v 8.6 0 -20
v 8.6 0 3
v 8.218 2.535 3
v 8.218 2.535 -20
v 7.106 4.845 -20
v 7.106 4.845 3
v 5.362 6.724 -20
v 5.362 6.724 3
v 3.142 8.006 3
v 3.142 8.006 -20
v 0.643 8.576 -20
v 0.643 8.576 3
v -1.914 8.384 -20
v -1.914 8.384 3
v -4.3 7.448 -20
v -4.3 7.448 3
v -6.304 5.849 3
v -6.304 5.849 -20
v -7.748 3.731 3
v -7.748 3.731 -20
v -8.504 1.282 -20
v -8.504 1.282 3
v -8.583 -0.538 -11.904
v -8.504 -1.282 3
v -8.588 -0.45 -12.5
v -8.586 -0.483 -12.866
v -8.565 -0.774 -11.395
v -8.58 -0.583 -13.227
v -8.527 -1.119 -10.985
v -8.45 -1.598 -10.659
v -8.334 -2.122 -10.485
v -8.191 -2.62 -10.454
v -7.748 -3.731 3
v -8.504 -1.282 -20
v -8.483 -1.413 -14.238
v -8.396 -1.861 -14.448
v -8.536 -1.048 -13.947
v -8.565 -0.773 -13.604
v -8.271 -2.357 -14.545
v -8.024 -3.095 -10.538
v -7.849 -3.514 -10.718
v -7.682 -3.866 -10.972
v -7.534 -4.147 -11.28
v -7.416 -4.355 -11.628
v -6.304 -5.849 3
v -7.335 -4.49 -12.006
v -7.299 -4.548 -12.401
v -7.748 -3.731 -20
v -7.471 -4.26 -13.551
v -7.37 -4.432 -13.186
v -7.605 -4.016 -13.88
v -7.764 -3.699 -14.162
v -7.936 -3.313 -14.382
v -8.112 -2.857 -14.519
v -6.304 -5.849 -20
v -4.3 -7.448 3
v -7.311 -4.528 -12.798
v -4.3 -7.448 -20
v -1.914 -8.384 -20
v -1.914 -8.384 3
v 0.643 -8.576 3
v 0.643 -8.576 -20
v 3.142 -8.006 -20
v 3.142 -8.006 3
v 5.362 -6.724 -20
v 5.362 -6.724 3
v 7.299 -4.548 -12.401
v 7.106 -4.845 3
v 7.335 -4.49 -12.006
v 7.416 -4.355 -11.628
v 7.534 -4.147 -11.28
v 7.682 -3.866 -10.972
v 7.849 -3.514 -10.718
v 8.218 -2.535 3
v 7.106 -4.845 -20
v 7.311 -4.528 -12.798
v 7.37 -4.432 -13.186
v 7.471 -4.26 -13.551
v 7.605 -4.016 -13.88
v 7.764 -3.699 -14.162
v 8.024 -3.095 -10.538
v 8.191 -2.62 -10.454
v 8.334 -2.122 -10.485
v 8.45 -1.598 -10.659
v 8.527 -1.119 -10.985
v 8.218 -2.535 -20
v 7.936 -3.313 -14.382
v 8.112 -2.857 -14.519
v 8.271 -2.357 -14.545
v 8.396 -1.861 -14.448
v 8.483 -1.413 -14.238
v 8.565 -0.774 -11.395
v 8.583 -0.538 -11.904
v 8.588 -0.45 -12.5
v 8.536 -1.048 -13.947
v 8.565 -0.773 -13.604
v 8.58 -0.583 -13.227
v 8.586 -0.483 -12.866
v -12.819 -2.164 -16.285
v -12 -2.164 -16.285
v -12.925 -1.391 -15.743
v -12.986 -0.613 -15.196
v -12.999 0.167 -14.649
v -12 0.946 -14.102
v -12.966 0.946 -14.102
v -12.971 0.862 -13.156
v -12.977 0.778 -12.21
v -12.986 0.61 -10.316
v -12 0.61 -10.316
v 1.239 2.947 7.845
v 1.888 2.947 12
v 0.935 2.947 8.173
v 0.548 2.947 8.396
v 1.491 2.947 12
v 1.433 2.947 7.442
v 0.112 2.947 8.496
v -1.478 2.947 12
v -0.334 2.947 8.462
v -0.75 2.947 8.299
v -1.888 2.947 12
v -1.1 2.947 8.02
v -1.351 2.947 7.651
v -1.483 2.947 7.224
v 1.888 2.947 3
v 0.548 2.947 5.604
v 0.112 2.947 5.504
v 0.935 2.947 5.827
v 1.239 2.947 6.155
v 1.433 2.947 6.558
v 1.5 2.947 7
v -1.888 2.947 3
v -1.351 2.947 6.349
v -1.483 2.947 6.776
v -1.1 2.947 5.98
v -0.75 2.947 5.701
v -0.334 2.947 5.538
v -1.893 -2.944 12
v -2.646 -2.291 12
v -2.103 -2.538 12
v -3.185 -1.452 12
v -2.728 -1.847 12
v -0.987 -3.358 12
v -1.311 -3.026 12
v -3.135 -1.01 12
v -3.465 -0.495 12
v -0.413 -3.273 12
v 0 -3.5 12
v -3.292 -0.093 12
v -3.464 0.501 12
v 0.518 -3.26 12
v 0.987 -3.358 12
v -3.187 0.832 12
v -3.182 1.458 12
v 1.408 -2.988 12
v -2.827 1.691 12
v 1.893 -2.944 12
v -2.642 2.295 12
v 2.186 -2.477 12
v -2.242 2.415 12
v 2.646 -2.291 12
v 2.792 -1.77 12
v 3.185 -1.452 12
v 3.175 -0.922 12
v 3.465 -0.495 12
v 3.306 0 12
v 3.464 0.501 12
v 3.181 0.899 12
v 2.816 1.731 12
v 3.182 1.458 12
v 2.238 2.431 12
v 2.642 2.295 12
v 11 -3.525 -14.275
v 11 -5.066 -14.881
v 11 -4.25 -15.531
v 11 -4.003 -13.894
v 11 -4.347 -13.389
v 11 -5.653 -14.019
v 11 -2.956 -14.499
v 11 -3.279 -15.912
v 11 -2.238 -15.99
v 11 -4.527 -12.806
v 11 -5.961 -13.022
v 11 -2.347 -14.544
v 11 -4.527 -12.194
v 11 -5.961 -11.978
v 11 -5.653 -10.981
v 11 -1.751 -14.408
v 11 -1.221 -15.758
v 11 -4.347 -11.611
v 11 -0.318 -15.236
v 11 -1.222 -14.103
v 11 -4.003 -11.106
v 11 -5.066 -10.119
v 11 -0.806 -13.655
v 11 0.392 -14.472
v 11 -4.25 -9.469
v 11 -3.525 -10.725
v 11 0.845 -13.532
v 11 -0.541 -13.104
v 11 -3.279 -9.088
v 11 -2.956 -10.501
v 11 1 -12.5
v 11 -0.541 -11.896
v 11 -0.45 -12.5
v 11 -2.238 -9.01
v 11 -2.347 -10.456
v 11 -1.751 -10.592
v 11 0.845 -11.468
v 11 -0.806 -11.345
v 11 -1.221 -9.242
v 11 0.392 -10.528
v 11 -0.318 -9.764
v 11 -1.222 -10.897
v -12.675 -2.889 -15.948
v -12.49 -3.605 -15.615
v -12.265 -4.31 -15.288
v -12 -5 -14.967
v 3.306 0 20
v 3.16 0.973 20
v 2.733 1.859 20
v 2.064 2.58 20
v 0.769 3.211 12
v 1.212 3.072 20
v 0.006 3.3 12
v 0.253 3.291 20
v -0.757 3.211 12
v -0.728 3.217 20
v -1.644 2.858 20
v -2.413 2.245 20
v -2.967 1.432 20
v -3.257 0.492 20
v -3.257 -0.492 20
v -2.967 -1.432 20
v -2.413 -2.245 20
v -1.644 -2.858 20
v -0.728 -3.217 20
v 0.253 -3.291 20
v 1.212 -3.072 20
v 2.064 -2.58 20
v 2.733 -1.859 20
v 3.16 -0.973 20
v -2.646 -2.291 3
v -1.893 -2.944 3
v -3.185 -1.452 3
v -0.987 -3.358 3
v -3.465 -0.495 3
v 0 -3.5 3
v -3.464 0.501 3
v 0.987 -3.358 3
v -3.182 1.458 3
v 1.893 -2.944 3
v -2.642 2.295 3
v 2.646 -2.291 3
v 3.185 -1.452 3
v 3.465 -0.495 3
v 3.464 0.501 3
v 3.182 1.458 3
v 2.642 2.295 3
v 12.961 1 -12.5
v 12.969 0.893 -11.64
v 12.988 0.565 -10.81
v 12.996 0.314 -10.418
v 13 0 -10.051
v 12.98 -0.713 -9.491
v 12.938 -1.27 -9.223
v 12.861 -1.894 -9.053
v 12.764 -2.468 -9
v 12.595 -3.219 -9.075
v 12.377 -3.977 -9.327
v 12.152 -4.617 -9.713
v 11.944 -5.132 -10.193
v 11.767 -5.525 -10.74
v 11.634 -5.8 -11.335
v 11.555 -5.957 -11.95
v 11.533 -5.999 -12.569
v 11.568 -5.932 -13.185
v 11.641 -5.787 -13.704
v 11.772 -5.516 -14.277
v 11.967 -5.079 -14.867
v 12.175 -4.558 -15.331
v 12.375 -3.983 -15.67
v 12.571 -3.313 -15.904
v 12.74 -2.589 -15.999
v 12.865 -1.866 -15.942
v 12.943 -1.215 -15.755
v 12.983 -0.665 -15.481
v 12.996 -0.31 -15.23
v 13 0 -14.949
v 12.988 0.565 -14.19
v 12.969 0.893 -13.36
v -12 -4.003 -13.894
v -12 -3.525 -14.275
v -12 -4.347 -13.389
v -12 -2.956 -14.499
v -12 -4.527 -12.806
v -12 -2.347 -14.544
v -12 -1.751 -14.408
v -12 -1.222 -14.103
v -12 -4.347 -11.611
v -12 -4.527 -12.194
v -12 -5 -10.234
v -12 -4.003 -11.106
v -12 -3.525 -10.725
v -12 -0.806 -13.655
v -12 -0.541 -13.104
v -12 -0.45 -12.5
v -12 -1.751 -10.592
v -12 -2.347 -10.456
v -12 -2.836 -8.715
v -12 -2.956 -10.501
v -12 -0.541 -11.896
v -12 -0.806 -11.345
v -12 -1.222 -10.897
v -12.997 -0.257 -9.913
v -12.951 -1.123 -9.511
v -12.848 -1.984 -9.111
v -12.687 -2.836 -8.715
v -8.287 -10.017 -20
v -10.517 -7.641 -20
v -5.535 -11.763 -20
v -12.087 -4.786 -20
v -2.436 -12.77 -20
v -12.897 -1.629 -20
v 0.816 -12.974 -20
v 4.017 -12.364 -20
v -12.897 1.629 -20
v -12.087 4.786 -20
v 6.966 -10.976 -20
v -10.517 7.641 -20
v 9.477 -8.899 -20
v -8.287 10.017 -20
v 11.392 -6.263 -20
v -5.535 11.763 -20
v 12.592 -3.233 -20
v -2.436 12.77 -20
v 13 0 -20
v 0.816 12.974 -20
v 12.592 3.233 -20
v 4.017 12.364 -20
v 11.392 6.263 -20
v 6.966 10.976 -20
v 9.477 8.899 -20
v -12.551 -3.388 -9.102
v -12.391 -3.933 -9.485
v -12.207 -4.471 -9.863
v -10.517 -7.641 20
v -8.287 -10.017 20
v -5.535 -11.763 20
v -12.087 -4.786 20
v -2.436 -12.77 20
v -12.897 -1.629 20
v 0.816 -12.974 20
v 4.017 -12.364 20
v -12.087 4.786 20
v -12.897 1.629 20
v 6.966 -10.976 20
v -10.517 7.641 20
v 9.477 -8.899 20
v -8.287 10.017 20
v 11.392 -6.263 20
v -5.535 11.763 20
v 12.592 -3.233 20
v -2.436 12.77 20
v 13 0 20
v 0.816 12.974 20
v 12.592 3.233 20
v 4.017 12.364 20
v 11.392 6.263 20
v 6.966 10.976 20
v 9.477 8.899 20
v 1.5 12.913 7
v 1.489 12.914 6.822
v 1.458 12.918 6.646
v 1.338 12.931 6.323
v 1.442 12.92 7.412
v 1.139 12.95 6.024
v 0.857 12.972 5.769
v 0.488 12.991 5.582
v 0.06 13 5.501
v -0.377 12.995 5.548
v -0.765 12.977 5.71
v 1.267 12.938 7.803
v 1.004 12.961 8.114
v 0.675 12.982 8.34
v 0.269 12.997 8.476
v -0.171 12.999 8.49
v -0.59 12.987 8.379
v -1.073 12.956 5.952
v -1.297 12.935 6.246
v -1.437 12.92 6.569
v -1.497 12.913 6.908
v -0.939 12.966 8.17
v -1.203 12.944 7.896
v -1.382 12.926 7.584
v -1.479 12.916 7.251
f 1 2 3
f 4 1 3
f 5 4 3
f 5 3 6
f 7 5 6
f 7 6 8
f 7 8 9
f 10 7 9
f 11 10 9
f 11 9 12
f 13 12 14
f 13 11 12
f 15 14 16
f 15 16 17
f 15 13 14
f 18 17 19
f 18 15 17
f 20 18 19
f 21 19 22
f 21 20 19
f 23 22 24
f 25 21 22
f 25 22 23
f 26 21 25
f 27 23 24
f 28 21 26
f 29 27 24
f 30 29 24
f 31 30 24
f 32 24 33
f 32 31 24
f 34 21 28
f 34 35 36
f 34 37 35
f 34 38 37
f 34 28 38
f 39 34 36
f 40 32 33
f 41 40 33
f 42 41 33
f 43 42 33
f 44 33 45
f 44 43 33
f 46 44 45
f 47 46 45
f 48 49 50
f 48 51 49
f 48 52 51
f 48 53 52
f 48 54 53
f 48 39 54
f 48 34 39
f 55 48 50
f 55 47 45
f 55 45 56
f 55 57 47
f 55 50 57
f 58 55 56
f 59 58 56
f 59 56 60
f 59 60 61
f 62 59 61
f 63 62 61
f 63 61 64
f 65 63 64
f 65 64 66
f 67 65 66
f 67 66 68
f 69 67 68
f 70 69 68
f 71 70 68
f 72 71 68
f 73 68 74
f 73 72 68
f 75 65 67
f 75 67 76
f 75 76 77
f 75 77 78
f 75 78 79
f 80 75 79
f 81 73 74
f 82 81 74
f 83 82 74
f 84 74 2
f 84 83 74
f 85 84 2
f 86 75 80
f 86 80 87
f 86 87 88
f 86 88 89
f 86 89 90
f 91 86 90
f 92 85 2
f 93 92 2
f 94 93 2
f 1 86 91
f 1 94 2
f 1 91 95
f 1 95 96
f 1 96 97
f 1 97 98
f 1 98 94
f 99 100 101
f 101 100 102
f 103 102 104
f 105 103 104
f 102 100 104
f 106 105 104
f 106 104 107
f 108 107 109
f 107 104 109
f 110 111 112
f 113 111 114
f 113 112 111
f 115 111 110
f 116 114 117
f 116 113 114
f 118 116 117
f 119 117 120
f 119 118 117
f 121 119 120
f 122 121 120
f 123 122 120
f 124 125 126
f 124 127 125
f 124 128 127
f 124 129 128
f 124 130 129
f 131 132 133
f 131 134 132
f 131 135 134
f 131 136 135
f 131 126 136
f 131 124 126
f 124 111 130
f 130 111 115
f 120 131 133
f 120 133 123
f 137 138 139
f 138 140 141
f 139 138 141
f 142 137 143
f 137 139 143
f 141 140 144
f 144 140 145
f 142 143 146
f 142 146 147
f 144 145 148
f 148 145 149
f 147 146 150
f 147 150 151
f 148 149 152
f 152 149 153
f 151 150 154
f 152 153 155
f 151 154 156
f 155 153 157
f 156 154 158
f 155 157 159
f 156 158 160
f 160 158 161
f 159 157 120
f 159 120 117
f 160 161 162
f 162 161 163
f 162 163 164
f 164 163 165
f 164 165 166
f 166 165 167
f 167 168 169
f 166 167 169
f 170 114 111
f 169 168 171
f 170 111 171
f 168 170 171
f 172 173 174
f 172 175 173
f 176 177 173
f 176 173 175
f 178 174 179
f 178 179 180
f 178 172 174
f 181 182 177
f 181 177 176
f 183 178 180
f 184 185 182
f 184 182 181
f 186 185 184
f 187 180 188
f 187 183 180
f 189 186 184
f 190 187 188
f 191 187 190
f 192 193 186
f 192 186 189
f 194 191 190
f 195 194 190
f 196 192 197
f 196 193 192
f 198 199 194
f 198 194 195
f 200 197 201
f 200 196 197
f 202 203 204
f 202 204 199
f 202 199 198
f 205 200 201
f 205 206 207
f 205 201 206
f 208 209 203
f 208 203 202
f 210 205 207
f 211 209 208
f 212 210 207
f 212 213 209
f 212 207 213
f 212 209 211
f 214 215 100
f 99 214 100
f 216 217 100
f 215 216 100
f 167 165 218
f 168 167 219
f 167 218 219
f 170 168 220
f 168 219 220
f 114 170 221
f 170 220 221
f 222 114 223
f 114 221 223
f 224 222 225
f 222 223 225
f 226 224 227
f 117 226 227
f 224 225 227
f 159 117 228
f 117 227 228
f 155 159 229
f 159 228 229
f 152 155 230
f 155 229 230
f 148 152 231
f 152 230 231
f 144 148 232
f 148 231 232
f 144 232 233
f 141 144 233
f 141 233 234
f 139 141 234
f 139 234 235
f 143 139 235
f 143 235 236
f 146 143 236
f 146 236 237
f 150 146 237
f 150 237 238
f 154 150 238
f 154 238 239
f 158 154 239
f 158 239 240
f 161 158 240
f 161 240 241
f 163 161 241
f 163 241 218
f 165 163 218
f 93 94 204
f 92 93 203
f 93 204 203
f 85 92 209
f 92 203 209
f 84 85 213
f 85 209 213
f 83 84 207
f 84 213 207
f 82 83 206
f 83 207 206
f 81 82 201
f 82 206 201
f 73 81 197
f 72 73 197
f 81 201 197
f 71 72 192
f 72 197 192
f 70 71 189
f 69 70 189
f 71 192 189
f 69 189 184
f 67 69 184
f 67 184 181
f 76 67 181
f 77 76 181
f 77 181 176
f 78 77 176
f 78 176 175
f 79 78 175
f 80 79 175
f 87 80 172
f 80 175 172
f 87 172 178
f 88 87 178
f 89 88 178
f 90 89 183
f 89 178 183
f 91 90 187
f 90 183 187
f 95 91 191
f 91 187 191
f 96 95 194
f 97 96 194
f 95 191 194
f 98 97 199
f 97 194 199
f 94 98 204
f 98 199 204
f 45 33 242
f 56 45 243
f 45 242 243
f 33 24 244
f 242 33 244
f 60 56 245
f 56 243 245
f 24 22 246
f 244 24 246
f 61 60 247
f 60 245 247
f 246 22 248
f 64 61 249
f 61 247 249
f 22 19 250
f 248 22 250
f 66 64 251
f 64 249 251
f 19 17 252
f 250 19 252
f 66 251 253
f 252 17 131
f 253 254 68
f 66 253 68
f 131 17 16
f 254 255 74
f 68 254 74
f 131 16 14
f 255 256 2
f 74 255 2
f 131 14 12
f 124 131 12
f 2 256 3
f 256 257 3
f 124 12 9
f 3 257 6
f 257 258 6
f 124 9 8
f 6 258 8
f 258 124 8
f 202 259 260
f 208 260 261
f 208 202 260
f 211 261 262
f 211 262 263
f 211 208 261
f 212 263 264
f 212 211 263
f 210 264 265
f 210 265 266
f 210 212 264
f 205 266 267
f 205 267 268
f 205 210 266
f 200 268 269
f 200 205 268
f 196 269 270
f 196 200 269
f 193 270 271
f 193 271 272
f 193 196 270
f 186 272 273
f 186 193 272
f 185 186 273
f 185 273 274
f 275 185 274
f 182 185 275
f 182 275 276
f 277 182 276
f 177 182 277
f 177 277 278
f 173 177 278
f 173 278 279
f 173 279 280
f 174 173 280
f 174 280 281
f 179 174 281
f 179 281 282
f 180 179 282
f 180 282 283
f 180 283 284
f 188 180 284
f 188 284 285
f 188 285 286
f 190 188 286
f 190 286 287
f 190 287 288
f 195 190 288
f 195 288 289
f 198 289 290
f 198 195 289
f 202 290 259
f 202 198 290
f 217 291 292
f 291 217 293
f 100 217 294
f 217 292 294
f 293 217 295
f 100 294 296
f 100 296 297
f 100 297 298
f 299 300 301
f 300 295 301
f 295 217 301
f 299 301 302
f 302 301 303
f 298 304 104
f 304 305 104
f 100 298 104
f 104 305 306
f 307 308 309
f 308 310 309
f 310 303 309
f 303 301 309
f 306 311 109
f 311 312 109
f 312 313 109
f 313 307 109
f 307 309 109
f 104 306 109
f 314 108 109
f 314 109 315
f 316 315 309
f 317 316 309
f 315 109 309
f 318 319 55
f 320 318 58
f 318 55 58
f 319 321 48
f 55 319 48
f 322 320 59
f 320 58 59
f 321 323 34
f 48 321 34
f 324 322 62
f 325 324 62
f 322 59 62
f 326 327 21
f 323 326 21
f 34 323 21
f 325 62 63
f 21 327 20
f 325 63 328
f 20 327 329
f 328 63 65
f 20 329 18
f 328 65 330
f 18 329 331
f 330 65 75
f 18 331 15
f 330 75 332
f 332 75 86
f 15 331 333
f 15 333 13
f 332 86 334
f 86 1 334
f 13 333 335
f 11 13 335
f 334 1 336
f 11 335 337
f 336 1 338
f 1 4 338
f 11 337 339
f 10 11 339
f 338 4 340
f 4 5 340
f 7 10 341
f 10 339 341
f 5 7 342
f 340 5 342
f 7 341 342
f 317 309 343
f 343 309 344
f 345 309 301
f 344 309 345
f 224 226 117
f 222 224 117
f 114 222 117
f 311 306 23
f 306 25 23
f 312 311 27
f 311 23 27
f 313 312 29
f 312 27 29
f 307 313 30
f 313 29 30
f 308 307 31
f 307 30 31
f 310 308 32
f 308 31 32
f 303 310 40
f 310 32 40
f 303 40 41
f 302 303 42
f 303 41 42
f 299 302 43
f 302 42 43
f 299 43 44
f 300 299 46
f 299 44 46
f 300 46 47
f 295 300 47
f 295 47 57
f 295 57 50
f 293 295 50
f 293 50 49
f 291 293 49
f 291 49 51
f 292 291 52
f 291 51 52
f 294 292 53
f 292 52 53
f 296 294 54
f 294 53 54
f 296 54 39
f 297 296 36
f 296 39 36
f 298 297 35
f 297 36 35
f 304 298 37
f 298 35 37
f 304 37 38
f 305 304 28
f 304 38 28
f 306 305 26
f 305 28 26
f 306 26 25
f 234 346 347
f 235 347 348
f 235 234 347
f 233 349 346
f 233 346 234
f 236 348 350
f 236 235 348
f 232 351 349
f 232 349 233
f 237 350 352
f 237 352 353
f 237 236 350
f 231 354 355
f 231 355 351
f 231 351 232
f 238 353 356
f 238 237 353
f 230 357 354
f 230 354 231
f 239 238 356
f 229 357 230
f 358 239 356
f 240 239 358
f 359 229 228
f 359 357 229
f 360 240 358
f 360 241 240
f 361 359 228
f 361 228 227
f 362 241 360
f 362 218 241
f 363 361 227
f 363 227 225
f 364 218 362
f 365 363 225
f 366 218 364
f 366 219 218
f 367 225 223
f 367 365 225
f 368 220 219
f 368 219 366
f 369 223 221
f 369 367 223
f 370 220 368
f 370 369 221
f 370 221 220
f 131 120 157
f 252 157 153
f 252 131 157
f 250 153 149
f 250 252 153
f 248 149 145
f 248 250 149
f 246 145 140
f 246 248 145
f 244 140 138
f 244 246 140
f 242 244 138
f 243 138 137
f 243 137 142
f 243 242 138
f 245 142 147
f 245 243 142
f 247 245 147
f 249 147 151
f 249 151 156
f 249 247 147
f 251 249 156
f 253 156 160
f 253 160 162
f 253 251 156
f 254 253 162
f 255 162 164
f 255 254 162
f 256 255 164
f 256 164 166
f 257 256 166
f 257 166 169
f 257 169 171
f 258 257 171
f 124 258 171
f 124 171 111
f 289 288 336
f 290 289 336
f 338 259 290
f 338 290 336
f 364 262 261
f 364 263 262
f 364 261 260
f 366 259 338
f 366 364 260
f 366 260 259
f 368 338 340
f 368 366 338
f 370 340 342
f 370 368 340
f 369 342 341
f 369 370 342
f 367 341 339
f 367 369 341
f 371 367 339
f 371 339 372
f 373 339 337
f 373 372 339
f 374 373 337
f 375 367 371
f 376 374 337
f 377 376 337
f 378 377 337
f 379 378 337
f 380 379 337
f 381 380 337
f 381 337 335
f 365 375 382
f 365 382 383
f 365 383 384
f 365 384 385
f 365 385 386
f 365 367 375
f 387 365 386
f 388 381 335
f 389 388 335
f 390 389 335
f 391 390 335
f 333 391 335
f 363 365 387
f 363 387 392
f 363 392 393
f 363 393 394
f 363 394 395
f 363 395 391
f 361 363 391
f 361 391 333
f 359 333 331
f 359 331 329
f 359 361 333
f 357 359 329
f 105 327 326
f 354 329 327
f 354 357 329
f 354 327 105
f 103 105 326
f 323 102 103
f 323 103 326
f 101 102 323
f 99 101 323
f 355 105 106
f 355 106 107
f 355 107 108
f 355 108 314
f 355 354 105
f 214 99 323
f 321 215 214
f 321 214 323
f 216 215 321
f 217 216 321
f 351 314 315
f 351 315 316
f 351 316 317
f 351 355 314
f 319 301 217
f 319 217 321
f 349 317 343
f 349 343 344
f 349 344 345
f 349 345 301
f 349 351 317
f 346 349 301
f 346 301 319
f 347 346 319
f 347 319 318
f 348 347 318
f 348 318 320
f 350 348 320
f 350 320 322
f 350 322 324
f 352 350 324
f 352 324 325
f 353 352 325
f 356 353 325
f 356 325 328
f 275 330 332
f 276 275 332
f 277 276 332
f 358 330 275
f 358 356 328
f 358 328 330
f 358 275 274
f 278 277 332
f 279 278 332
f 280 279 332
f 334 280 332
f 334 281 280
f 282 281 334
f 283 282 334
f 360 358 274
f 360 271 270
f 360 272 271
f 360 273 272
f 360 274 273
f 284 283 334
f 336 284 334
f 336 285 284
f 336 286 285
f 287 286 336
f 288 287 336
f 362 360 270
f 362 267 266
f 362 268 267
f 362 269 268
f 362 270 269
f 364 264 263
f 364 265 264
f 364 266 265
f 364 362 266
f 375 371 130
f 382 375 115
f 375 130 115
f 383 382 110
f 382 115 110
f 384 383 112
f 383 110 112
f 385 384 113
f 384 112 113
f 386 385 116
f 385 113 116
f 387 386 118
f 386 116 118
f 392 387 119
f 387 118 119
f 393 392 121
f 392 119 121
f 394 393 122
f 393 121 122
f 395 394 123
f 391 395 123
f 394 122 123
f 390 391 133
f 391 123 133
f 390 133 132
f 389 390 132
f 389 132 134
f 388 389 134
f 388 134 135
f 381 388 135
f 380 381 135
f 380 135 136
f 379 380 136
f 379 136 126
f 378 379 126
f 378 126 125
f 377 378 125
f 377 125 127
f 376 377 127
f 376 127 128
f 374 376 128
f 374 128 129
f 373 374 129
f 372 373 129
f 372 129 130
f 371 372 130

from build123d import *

# Parameters (mm, degrees)
F0_R      = 13
F5_DEPTH  = 20
F4_R      = 8.6
F6_DEPTH  = 23
F3_R      = 3.3
F8_DEPTH  = 8
F9_DEPTH  = 12
F10_R     = 2.05
F11_DEPTH = 15
F12_R     = 1.5
F13_DEPTH = 25
F15_R     = 3.5
F16_DEPTH = 5
F19_DEPTH = 3


with BuildPart() as f5:
    # F0 (on Top) → F5 (new body, symmetric)
    with BuildSketch(Plane.XY):
        Circle(F0_R)
    extrude(amount=F5_DEPTH, both=True)

    # F4 (on offset) → F6 (cut)
    with BuildSketch(Plane.XY.offset(-20)):
        Circle(F4_R)
    extrude(amount=F6_DEPTH, mode=Mode.SUBTRACT)

    # F3 (on offset) → F8 (cut)
    with BuildSketch(Plane.XY.offset(20)):
        with Locations((0.0063437128, 0)):
            Circle(F3_R)
    extrude(amount=-F8_DEPTH, mode=Mode.SUBTRACT)

    # F7 (on Top) → F9 (cut)
    with BuildSketch(Plane.XY):
        with BuildLine():
            Line((1.888, 2.9471097706), (0, 2.9471097706))
            Line((0, 2.9471097706), (-1.888, 2.9471097706))
            ThreePointArc((-1.888, 2.9471097706), (0, -3.5), (1.888, 2.9471097706))
        make_face()
    extrude(amount=F9_DEPTH, mode=Mode.SUBTRACT)

    # F10 (on Right) → F11 (cut, symmetric)
    with BuildSketch(Plane.YZ):
        with Locations((-2.5, -12.5)):
            Circle(F10_R)
    extrude(amount=F11_DEPTH, both=True, mode=Mode.SUBTRACT)

    # F12 (on Front) → F13 (cut)
    with BuildSketch(Plane.XZ):
        with Locations((0, 7)):
            Circle(F12_R)
    extrude(amount=-F13_DEPTH, mode=Mode.SUBTRACT)

    # F15 (on offset) → F16 (cut)
    with BuildSketch(Plane.YZ.offset(11)):
        with Locations((-2.5, -12.5)):
            Circle(F15_R)
    extrude(amount=F16_DEPTH, mode=Mode.SUBTRACT)

    # F18 (on offset) → F19 (cut)
    with BuildSketch(Plane.YZ.offset(-12)):
        Polygon((-5.9460342998, -10.8984858401), (-5.6099690969, -14.683596166), (-2.1639347971, -16.2851103259), (0.9460342998, -14.1015141599), (0.6099690969, -10.316403834), (-2.8360652029, -8.7148896741), align=None)
    extrude(amount=-F19_DEPTH, mode=Mode.SUBTRACT)


solid = f5.part
